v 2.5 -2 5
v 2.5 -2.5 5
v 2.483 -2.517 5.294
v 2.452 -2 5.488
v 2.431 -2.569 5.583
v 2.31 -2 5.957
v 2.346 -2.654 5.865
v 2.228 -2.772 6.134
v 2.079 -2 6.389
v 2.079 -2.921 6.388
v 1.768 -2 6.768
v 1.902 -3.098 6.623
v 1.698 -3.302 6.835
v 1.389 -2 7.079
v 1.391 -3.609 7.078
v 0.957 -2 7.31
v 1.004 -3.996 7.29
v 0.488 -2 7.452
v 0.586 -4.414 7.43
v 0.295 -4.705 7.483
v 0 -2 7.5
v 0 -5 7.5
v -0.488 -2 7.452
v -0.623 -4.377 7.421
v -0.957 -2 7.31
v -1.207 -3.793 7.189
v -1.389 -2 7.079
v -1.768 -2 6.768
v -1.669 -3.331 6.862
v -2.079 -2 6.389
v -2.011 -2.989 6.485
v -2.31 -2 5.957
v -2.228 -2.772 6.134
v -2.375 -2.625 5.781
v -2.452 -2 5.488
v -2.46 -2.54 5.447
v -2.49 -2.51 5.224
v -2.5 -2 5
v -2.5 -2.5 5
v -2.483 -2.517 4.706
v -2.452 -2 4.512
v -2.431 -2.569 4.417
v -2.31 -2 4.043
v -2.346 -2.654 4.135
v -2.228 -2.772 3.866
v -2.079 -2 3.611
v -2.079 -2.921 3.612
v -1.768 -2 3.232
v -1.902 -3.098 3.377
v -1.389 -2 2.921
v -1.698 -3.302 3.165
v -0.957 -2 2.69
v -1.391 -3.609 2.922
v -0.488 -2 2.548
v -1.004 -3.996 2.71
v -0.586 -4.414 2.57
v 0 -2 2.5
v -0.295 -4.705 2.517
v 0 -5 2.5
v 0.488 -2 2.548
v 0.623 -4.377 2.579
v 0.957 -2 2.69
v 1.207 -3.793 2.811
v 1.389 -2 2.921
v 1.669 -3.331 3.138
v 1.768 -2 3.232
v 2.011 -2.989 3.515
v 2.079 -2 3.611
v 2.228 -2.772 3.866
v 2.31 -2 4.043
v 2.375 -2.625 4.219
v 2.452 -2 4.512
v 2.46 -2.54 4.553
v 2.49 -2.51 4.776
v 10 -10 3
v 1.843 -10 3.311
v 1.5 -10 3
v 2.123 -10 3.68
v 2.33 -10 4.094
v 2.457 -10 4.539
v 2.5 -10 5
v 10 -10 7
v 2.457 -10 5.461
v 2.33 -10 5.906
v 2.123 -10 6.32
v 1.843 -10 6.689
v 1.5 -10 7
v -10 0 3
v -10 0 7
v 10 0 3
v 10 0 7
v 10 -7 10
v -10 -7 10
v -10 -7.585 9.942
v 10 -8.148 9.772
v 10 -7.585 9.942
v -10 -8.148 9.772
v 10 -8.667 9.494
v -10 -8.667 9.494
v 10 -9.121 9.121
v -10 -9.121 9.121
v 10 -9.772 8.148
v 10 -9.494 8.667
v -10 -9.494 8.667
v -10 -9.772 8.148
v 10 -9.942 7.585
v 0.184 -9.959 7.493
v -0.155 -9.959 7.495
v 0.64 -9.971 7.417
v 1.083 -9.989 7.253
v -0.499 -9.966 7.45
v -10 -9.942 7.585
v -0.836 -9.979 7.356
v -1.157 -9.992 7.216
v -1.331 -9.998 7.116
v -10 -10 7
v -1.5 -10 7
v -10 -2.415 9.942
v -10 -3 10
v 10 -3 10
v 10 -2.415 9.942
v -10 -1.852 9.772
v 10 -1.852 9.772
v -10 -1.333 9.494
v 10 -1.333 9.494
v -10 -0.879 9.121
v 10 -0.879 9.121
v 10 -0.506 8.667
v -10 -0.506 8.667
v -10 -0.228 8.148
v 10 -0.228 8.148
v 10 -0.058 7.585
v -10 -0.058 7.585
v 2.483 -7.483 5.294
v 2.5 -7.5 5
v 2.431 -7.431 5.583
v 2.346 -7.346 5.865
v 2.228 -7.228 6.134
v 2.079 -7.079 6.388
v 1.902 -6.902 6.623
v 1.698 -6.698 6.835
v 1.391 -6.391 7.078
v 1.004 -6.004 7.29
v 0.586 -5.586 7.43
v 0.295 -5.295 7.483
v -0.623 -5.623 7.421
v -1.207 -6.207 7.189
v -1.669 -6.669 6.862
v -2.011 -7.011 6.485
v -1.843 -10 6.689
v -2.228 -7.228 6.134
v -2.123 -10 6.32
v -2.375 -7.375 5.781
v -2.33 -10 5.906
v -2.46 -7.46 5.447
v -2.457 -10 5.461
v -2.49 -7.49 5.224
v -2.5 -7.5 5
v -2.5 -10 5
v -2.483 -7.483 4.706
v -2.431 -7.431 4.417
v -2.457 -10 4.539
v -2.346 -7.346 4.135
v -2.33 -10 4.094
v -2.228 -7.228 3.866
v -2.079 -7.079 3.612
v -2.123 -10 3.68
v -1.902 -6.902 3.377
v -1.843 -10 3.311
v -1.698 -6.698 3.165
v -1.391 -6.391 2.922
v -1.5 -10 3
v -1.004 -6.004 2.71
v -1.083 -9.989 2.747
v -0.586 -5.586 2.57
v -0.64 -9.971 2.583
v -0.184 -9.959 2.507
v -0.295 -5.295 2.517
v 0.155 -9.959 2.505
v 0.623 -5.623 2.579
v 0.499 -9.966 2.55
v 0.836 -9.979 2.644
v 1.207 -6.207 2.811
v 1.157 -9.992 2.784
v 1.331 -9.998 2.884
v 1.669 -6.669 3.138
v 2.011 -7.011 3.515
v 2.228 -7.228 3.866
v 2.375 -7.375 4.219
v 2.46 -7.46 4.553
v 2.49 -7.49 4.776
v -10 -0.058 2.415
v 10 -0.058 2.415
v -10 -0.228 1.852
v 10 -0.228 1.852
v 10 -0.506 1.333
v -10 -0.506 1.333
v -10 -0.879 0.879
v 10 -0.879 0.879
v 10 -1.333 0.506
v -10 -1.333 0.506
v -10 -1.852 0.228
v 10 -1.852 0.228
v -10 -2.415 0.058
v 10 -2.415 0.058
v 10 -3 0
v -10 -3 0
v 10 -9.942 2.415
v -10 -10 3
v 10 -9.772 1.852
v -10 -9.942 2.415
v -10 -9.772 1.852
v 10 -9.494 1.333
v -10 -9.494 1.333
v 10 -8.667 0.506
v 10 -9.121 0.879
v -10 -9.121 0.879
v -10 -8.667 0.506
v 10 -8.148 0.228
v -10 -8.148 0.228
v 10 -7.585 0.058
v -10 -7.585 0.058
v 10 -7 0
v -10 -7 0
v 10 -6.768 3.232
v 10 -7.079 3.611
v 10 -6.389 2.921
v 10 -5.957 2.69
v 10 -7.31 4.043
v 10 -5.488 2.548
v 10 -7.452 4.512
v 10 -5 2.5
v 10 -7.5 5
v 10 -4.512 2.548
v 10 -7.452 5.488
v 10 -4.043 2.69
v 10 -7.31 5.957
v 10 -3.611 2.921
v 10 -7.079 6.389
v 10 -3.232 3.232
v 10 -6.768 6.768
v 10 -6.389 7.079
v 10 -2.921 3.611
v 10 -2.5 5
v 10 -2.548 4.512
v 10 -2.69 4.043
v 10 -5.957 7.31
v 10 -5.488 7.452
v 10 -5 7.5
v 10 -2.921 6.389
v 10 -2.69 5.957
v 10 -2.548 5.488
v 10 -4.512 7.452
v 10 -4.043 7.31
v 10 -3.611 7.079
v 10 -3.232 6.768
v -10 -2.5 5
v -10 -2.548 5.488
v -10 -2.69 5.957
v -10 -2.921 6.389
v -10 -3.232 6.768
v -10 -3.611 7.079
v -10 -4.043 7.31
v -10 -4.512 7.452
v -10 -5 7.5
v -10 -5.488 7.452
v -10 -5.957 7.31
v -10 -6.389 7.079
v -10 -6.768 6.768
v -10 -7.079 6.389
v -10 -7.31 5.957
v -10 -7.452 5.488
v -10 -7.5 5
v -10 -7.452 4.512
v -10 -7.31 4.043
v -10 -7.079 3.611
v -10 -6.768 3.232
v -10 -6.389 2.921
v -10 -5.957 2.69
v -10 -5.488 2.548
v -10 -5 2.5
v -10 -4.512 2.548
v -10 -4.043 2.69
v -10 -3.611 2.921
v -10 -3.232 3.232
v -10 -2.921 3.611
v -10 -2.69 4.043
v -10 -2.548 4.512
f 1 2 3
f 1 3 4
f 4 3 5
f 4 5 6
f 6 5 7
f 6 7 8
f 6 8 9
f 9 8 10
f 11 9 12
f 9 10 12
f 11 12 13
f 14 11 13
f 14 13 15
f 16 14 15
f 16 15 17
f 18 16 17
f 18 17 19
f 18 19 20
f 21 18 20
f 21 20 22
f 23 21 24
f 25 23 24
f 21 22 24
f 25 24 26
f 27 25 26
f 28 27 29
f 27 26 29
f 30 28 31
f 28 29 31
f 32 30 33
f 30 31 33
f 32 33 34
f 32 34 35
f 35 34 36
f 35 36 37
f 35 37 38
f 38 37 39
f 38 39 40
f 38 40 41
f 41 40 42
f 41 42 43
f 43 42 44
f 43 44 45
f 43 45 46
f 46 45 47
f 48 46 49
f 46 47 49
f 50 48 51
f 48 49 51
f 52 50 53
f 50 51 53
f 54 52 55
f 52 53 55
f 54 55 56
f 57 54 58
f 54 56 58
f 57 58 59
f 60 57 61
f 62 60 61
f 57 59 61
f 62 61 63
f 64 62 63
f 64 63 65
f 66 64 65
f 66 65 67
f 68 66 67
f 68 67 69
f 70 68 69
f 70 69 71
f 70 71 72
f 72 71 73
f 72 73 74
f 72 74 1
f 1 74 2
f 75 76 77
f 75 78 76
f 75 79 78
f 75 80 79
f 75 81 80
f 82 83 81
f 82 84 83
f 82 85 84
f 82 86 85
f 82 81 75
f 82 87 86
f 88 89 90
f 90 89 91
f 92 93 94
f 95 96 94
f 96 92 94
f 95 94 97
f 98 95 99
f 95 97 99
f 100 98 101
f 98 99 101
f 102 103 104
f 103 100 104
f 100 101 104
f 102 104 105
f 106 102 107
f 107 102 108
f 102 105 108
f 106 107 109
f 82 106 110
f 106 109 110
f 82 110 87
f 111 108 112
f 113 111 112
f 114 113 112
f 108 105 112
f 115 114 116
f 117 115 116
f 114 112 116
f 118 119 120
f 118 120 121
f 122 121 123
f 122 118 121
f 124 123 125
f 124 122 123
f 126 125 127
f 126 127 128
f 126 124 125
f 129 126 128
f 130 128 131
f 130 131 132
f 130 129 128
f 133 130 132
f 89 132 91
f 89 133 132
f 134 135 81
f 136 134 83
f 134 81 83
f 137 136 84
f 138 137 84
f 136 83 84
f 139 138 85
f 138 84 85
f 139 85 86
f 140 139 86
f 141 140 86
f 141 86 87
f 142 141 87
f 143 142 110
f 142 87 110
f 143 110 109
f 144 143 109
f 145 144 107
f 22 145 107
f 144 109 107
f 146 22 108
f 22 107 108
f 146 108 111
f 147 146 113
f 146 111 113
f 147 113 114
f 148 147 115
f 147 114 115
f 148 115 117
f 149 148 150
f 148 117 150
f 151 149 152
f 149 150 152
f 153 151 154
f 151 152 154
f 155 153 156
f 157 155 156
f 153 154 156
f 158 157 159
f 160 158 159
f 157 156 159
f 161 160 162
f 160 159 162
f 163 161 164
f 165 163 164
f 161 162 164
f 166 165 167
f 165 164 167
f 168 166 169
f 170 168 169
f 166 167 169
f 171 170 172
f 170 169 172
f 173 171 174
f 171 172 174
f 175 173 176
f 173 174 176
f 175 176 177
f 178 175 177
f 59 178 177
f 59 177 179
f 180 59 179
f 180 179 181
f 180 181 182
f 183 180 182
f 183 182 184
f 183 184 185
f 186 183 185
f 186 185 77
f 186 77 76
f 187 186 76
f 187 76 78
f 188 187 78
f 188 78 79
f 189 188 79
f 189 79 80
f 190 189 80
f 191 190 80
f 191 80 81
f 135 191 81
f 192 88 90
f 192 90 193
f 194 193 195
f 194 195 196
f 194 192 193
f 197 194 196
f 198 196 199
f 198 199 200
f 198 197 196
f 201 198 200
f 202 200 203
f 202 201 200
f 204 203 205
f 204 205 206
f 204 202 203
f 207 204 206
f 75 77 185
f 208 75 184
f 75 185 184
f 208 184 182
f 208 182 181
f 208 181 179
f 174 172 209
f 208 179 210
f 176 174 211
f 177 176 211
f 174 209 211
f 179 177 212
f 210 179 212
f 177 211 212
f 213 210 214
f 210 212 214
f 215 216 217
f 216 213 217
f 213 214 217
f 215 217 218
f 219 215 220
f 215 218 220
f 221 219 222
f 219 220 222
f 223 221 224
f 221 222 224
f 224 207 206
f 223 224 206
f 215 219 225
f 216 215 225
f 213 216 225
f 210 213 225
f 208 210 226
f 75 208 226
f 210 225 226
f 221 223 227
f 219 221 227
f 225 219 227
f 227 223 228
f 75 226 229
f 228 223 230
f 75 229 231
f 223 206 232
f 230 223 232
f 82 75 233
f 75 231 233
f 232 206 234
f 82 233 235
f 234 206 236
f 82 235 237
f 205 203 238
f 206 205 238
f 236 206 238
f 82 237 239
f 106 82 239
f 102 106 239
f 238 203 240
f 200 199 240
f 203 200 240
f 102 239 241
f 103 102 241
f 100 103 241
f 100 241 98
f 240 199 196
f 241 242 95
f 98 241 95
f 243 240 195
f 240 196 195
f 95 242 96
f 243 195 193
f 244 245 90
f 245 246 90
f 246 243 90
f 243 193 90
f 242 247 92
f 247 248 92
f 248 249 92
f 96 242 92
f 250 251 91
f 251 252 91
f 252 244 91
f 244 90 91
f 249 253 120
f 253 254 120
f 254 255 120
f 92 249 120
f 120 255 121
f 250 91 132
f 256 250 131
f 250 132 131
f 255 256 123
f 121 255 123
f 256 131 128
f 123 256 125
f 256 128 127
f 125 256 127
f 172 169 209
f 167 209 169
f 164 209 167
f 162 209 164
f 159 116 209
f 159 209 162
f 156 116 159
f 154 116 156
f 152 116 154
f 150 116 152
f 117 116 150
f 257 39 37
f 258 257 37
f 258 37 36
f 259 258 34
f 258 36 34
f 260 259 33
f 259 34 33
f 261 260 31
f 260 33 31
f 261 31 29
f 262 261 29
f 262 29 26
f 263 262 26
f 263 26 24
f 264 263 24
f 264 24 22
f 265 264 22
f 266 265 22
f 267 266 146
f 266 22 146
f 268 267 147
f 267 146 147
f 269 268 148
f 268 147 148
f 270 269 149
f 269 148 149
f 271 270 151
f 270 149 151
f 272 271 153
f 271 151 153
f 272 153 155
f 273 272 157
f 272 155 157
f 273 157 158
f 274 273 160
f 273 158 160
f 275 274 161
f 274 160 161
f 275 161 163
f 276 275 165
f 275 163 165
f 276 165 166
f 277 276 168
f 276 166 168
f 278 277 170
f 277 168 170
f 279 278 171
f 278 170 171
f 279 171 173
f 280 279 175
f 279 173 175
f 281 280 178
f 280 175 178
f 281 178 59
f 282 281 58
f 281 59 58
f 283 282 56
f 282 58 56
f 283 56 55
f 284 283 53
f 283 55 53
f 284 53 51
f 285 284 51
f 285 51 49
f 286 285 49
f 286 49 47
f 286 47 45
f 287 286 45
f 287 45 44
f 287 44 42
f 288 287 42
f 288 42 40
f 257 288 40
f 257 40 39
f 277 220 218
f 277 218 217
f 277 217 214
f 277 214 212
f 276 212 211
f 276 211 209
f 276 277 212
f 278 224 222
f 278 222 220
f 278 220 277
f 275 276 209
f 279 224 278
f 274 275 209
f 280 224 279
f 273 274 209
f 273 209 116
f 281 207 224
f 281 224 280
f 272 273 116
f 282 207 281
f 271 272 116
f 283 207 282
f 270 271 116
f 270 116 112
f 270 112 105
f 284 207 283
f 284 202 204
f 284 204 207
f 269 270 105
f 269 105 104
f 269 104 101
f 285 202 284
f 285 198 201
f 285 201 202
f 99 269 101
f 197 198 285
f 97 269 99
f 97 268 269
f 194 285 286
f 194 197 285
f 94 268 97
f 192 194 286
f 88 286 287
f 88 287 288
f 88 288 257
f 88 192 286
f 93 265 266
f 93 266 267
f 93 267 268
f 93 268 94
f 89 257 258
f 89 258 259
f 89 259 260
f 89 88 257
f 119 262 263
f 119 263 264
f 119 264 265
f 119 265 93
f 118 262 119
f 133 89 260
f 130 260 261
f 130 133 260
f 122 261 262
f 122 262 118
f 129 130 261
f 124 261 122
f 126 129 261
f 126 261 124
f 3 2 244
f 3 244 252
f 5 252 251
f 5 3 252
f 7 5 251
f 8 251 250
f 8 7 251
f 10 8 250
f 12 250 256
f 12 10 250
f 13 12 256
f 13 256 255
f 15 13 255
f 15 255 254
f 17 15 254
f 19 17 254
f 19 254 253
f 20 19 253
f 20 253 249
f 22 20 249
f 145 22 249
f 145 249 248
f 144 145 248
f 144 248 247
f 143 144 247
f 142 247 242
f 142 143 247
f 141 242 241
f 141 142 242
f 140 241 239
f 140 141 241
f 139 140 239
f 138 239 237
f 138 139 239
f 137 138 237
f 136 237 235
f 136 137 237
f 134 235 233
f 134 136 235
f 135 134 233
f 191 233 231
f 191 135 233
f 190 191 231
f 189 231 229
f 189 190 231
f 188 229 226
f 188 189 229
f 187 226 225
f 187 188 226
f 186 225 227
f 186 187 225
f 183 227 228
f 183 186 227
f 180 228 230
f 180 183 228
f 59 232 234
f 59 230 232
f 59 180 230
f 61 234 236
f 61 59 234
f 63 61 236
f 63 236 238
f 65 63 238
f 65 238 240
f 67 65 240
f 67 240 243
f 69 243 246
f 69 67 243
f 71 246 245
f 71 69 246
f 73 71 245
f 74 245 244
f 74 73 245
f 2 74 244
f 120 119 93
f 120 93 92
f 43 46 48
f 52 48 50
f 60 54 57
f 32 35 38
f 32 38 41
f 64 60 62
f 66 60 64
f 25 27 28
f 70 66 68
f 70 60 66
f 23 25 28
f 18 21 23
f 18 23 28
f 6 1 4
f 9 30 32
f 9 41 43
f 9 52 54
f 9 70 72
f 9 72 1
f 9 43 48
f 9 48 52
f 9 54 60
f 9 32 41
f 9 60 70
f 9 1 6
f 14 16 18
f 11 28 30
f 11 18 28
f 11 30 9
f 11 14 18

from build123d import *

# Parameters (mm, degrees)
F0_W          = 20
F0_H          = 10
F1_DEPTH      = 10
F2_R          = 2.5
F3_DEPTH      = 8
F4_R          = 2.5
F5_DEPTH      = 10.001
F5_DEPTH_BACK = 10.001
F6_T1_DEPTH   = 35


# Not quite as in the source:
# - a fillet or chamfer that OpenCascade refuses, or shapes differently, is made with other operations: its cross-section is extruded or revolved along the edge and cut away or added


with BuildPart() as f1:
    # F0 (on Front) → F1 (new body)
    with BuildSketch(Plane.XZ):
        with Locations((0, 5)):
            Rectangle(F0_W, F0_H)
    extrude(amount=F1_DEPTH)

    # F2 (on face) → F3 (cut)
    with BuildSketch(Plane.XZ.offset(10)):
        with Locations((0, 5)):
            Circle(F2_R)
    extrude(amount=-F3_DEPTH, mode=Mode.SUBTRACT)

    # F4 (on Right) → F5 (cut, two sides)
    with BuildSketch(Plane.YZ) as f5_sk:
        with Locations((-5, 5)):
            Circle(F4_R)
    extrude(amount=-F5_DEPTH, mode=Mode.SUBTRACT)
    extrude(f5_sk.sketch, amount=F5_DEPTH_BACK, mode=Mode.SUBTRACT)

    # F6: fillet of radius 3 on 4 edges, made by hand

    # F6_s2 → F6_t1 (cut)
    with BuildSketch(Plane.YZ.offset(-17.5)):
        with BuildLine():
            ThreePointArc((-3, 10), (-0.8786796564, 9.1213203436), (0, 7))
            Line((0, 7), (0, 10))
            Line((0, 10), (-3, 10))
        make_face()
        with BuildLine():
            ThreePointArc((-7, 10), (-9.1213203436, 9.1213203436), (-10, 7))
            Line((-10, 7), (-10, 10))
            Line((-10, 10), (-7, 10))
        make_face()
        with BuildLine():
            ThreePointArc((-10, 3), (-9.1213203436, 0.8786796564), (-7, 0))
            Line((-7, 0), (-10, 0))
            Line((-10, 0), (-10, 3))
        make_face()
        with BuildLine():
            ThreePointArc((0, 3), (-0.8786796564, 0.8786796564), (-3, 0))
            Line((-3, 0), (0, 0))
            Line((0, 0), (0, 3))
        make_face()
    extrude(amount=F6_T1_DEPTH, mode=Mode.SUBTRACT)


solid = f1.part
